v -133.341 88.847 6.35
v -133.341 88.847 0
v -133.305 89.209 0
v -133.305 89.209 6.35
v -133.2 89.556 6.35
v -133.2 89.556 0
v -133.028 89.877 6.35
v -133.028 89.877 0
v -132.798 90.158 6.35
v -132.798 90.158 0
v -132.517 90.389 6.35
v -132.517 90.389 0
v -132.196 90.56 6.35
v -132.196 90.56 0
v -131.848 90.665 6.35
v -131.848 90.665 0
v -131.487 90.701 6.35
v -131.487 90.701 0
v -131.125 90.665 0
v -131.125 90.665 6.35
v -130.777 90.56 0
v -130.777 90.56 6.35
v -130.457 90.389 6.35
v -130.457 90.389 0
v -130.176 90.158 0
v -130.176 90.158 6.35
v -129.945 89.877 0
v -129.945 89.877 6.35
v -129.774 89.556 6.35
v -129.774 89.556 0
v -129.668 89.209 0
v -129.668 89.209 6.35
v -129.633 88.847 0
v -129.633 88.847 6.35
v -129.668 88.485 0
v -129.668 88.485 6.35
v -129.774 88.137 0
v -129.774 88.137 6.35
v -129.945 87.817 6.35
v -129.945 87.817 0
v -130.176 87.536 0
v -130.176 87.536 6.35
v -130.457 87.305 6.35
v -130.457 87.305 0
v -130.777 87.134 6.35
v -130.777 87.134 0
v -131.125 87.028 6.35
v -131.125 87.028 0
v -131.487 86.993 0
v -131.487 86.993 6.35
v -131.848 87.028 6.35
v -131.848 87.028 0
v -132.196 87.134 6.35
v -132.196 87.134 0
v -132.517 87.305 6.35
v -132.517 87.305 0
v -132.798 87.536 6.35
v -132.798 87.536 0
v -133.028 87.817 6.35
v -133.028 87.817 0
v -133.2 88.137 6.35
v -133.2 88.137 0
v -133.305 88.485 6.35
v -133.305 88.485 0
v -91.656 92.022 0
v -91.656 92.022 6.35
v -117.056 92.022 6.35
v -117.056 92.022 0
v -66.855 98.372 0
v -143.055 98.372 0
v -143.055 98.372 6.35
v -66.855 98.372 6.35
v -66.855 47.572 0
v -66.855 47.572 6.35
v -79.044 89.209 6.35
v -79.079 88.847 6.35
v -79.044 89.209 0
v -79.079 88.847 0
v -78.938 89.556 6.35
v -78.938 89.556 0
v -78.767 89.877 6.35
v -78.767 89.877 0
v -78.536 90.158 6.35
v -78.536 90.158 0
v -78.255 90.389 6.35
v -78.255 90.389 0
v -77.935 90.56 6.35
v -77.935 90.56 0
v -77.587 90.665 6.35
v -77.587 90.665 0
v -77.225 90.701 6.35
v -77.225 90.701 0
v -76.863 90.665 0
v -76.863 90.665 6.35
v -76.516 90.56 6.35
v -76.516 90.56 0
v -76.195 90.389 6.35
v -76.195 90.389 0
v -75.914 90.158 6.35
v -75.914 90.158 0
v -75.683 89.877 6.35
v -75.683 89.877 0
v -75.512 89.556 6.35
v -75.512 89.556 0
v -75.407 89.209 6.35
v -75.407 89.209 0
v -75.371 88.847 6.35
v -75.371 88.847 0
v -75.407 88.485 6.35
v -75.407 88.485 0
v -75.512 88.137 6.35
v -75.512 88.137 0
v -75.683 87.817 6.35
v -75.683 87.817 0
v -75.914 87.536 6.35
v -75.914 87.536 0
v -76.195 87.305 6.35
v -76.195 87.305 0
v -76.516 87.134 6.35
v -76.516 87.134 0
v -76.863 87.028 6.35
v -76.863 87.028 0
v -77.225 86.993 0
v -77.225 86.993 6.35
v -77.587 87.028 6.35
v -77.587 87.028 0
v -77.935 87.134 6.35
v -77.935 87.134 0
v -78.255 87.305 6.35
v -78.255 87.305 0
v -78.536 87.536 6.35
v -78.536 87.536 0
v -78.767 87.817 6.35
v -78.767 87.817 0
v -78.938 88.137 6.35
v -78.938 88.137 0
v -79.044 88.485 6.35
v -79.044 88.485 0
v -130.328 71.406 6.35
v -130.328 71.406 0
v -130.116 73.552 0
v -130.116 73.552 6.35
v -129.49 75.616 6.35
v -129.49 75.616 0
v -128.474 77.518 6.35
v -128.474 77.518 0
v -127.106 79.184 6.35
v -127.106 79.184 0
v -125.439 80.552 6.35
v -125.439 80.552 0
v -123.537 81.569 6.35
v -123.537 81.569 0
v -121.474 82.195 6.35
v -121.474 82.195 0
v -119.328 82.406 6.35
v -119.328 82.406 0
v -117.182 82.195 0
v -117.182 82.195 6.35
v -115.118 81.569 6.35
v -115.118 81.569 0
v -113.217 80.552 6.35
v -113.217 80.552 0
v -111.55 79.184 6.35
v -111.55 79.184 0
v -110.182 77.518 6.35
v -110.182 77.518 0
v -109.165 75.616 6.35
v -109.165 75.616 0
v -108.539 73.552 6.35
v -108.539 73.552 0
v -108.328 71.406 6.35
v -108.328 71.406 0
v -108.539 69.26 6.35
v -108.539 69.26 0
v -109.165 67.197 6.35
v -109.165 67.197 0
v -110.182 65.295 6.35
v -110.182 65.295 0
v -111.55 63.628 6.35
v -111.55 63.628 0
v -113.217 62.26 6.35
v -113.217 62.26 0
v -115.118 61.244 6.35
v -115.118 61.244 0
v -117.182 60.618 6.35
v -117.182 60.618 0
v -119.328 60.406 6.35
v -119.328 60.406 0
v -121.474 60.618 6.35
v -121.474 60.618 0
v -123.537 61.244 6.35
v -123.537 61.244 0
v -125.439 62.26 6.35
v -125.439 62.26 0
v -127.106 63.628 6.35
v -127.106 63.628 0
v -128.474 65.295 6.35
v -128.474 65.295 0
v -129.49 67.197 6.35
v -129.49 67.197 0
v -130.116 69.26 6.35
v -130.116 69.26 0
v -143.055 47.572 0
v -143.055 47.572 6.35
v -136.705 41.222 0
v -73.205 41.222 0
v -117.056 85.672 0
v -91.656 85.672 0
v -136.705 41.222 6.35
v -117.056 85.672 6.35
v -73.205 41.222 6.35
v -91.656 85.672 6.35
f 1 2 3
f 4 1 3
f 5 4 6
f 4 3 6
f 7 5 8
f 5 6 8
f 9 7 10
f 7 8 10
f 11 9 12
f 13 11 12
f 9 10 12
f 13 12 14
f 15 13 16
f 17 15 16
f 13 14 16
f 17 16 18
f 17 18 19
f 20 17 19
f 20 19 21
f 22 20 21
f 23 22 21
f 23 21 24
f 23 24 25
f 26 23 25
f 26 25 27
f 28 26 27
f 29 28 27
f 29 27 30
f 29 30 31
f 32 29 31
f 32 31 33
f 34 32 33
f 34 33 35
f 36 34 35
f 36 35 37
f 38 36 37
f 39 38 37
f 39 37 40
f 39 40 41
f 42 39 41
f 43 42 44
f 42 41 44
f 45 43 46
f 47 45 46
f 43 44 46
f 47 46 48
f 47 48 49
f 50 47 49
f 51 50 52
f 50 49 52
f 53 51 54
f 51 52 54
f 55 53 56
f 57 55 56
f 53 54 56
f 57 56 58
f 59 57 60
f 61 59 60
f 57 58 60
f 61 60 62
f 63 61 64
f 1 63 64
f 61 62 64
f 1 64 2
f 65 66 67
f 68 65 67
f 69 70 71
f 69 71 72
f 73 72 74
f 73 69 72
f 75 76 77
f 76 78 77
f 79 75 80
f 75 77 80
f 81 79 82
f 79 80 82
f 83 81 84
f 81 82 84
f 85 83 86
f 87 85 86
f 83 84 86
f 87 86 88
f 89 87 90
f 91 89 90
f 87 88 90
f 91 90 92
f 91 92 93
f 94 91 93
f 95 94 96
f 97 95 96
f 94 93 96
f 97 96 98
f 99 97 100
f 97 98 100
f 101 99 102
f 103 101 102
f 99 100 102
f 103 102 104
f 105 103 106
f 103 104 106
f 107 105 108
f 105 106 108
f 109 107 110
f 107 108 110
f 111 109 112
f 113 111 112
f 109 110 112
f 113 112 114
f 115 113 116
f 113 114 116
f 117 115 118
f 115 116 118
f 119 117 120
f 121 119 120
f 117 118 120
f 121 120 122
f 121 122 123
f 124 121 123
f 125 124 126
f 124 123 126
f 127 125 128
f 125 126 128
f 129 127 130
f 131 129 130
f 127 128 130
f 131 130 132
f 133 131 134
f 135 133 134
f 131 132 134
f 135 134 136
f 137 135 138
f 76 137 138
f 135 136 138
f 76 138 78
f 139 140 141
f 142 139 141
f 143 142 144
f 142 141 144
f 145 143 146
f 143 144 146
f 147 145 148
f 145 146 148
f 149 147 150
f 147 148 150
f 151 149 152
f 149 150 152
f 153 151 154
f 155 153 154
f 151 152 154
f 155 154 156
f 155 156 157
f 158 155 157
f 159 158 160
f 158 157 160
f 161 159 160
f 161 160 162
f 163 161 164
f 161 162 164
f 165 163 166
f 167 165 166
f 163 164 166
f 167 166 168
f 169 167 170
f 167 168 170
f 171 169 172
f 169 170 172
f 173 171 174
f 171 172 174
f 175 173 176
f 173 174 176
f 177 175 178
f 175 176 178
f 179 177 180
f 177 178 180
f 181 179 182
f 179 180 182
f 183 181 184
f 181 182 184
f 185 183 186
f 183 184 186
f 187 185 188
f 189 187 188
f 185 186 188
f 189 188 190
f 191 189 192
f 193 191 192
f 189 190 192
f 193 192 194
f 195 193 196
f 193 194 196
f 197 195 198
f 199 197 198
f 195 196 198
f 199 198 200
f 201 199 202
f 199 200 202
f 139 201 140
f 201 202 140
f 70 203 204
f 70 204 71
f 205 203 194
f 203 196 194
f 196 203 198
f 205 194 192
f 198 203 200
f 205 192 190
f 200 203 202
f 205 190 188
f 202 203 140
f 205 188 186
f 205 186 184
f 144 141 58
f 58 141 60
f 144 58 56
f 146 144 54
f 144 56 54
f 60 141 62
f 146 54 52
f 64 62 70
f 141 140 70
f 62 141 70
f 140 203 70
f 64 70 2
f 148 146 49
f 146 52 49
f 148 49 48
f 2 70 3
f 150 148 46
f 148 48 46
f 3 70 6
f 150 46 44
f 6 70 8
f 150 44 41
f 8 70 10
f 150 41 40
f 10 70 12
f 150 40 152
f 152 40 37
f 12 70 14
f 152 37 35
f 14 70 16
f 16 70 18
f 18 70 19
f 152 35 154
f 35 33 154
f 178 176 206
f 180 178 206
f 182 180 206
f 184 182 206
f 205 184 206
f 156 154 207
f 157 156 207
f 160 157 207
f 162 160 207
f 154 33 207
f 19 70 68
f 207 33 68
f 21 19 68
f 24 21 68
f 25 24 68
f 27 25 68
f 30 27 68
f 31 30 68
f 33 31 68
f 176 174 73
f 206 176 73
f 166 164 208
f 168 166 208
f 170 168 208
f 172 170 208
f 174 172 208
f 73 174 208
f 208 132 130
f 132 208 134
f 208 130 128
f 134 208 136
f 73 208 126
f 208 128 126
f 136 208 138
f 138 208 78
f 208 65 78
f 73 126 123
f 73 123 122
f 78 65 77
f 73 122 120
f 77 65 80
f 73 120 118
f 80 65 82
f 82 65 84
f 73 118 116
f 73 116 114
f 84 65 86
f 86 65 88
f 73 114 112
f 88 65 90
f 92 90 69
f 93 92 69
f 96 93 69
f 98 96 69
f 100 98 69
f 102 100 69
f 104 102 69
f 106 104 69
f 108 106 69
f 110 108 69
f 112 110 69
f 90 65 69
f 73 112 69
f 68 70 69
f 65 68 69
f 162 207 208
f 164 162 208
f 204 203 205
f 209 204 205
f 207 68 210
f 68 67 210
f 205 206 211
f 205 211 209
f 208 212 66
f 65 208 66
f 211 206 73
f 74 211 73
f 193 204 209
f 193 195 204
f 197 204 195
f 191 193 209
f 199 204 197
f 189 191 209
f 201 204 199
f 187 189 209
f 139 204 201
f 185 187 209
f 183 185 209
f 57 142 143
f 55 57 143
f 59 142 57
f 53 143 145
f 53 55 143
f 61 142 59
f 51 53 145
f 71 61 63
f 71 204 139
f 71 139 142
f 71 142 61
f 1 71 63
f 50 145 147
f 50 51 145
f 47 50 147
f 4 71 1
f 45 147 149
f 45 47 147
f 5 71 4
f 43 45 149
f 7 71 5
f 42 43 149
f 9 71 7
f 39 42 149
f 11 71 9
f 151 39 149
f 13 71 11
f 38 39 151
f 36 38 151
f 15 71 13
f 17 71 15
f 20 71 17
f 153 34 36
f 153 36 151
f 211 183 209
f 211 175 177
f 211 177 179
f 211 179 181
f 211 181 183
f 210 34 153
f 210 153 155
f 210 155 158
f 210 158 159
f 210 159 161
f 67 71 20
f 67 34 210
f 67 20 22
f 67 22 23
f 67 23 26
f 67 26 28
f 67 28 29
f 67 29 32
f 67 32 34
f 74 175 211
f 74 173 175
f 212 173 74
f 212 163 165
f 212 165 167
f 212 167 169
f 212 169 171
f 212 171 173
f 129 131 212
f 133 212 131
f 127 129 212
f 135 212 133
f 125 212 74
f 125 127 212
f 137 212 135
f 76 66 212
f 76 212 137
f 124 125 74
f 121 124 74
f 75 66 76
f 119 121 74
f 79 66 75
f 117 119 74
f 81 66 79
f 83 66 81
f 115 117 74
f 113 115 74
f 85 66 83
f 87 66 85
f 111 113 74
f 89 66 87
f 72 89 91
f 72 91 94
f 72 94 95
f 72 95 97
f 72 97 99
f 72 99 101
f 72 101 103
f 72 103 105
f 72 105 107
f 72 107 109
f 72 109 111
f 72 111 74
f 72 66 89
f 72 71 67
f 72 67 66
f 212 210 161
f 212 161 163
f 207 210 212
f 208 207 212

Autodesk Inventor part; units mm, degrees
ref_plane "YZ Plane" through (0, 0, 0) normal (1, 0, 0) x (0, 1, 0)
ref_plane "XZ Plane" through (0, 0, 0) normal (0, 1, 0) x (-1, 0, 0)
ref_plane "XY Plane" through (0, 0, 0) normal (0, 0, 1) x (1, 0, 0)
sketch "Sketch1" plane through (0, 0, 0) normal (0, 0, 1) x (1, 0, 0)
  line L0 (-73.2051, 41.2219) -> (-136.7051, 41.2219)
  line L1 (-143.0551, 47.5719) -> (-143.0551, 98.3719)
  line L2 (-143.0551, 98.3719) -> (-66.8551, 98.3719)
  line L3 (-66.8551, 98.3719) -> (-66.8551, 47.5719)
  line L4 (-143.0551, 47.5719) -> (-136.7051, 41.2219)
  line L5 (-73.2051, 41.2219) -> (-66.8551, 47.5719)
  point P0 (0, 0)
  point P1 (-66.8551, 41.2219)
  point P2 (-143.0551, 41.2219)
  point P3 (-117.6551, 41.2219)
  point P4 (-143.0551, 66.6219)
  point P5 (-66.8551, 72.9719)
  point P6 (-92.2551, 41.2219)
  point P7 (-143.0551, 41.2219)
  point P8 (-66.8551, 41.2219)
  dimension "d0" = 76.2
  dimension "d1" = 57.15
  dimension "d10" = 6.35
  dimension "d11" = 6.35
  dimension "d12" = 6.35
extrude "Extrusion1" add sketch "Sketch1" along normal blind 6.35
sketch "Sketch2" plane through (0, 0, 6.35) normal (0, 0, 1) x (1, 0, 0)
  line L0 (-130.3551, 77.0986) -> (-130.3551, 56.1453)
  line L1 (-130.3551, 66.6219) -> (-98.3601, 66.6219) construction
  arc A0 (-120.0565, 65.1716) -> (-124.5928, 66.6219) centre (-122.0928, 66.6219) ccw
  line L2 (-124.5928, 66.6219) -> (-120.0565, 65.1716) projected
  point P0 (0, 0)
  dimension "d4" = 5
extrude "Extrusion2" [suppressed]
sketch "Sketch3" plane through (0, 0, 0) normal (0, 0, -1) x (-1, 0, 0)
  arc A0 (124.5928, 66.6219) -> (120.0565, 65.1716) centre (122.0928, 66.6219) ccw projected
  line L0 (124.5928, 66.6219) -> (120.0565, 65.1716) projected
  circle A1 centre (122.0928, 66.6219) radius 11
  point P0 (0, 0)
extrude "Extrusion3" [suppressed]
sketch "Sketch4" plane through (0, 0, 0) normal (0, 0, -1) x (-1, 0, 0)
  line L0 (143.0551, 92.0219) -> (133.3409, 92.0219) construction
  line L1 (143.0551, 85.6719) -> (133.3409, 85.6719) construction
  line L2 (143.0551, 85.6719) -> (143.0551, 98.3719) construction
  line L3 (35.1051, 88.8469) -> (143.0551, 88.8469) construction
  circle A0 centre (77.2251, 88.8469) radius 1.8542
  circle A1 centre (131.4867, 88.8469) radius 1.8542
  line L4 (133.3409, 92.0219) -> (133.3409, 85.6719) projected
  point P0 (0, 0)
  dimension "d15" = 3.7084
  dimension "d16" = 3.7084
extrude "Extrusion4" cut sketch "Sketch4" against normal through all
sketch "Sketch5" plane through (0, 0, 0) normal (0, 0, -1) x (-1, 0, 0)
  circle A0 centre (122.6066, 75.5662) radius 1.5875 projected
  circle A1 centre (131.037, 66.1081) radius 1.5875 projected
  circle A2 centre (121.5789, 57.6777) radius 1.5875 projected
  circle A3 centre (113.1485, 67.1358) radius 1.5875 projected
  point P0 (0, 0)
extrude "Extrusion5" [suppressed]
sketch "Sketch6" plane through (0, 0, 0) normal (0, 0, -1) x (-1, 0, 0)
  circle A0 centre (119.3278, 71.4063) radius 11 projected
  point P0 (0, 0)
extrude "Extrusion6" cut sketch "Sketch6" against normal through all
sketch "Sketch7" plane through (0, 0, 6.35) normal (0, 0, 1) x (1, 0, 0)
  line L0 (-91.6559, 92.0219) -> (-117.0559, 92.0219) projected
  line L1 (-117.0559, 85.6719) -> (-91.6559, 85.6719) projected
  line L2 (-91.6559, 85.6719) -> (-91.6559, 92.0219) projected
  line L3 (-117.0559, 92.0219) -> (-117.0559, 85.6719) projected
  point P0 (0, 0)
extrude "Extrusion7" cut sketch "Sketch7" against normal through all
equation "\"d10\" = d9"
equation "\"d12\" = d11"
equation "\"d9\" = 6.35"
properties part number "projectorMountOppositeSide_RB01" material "Wood (Oak)"
